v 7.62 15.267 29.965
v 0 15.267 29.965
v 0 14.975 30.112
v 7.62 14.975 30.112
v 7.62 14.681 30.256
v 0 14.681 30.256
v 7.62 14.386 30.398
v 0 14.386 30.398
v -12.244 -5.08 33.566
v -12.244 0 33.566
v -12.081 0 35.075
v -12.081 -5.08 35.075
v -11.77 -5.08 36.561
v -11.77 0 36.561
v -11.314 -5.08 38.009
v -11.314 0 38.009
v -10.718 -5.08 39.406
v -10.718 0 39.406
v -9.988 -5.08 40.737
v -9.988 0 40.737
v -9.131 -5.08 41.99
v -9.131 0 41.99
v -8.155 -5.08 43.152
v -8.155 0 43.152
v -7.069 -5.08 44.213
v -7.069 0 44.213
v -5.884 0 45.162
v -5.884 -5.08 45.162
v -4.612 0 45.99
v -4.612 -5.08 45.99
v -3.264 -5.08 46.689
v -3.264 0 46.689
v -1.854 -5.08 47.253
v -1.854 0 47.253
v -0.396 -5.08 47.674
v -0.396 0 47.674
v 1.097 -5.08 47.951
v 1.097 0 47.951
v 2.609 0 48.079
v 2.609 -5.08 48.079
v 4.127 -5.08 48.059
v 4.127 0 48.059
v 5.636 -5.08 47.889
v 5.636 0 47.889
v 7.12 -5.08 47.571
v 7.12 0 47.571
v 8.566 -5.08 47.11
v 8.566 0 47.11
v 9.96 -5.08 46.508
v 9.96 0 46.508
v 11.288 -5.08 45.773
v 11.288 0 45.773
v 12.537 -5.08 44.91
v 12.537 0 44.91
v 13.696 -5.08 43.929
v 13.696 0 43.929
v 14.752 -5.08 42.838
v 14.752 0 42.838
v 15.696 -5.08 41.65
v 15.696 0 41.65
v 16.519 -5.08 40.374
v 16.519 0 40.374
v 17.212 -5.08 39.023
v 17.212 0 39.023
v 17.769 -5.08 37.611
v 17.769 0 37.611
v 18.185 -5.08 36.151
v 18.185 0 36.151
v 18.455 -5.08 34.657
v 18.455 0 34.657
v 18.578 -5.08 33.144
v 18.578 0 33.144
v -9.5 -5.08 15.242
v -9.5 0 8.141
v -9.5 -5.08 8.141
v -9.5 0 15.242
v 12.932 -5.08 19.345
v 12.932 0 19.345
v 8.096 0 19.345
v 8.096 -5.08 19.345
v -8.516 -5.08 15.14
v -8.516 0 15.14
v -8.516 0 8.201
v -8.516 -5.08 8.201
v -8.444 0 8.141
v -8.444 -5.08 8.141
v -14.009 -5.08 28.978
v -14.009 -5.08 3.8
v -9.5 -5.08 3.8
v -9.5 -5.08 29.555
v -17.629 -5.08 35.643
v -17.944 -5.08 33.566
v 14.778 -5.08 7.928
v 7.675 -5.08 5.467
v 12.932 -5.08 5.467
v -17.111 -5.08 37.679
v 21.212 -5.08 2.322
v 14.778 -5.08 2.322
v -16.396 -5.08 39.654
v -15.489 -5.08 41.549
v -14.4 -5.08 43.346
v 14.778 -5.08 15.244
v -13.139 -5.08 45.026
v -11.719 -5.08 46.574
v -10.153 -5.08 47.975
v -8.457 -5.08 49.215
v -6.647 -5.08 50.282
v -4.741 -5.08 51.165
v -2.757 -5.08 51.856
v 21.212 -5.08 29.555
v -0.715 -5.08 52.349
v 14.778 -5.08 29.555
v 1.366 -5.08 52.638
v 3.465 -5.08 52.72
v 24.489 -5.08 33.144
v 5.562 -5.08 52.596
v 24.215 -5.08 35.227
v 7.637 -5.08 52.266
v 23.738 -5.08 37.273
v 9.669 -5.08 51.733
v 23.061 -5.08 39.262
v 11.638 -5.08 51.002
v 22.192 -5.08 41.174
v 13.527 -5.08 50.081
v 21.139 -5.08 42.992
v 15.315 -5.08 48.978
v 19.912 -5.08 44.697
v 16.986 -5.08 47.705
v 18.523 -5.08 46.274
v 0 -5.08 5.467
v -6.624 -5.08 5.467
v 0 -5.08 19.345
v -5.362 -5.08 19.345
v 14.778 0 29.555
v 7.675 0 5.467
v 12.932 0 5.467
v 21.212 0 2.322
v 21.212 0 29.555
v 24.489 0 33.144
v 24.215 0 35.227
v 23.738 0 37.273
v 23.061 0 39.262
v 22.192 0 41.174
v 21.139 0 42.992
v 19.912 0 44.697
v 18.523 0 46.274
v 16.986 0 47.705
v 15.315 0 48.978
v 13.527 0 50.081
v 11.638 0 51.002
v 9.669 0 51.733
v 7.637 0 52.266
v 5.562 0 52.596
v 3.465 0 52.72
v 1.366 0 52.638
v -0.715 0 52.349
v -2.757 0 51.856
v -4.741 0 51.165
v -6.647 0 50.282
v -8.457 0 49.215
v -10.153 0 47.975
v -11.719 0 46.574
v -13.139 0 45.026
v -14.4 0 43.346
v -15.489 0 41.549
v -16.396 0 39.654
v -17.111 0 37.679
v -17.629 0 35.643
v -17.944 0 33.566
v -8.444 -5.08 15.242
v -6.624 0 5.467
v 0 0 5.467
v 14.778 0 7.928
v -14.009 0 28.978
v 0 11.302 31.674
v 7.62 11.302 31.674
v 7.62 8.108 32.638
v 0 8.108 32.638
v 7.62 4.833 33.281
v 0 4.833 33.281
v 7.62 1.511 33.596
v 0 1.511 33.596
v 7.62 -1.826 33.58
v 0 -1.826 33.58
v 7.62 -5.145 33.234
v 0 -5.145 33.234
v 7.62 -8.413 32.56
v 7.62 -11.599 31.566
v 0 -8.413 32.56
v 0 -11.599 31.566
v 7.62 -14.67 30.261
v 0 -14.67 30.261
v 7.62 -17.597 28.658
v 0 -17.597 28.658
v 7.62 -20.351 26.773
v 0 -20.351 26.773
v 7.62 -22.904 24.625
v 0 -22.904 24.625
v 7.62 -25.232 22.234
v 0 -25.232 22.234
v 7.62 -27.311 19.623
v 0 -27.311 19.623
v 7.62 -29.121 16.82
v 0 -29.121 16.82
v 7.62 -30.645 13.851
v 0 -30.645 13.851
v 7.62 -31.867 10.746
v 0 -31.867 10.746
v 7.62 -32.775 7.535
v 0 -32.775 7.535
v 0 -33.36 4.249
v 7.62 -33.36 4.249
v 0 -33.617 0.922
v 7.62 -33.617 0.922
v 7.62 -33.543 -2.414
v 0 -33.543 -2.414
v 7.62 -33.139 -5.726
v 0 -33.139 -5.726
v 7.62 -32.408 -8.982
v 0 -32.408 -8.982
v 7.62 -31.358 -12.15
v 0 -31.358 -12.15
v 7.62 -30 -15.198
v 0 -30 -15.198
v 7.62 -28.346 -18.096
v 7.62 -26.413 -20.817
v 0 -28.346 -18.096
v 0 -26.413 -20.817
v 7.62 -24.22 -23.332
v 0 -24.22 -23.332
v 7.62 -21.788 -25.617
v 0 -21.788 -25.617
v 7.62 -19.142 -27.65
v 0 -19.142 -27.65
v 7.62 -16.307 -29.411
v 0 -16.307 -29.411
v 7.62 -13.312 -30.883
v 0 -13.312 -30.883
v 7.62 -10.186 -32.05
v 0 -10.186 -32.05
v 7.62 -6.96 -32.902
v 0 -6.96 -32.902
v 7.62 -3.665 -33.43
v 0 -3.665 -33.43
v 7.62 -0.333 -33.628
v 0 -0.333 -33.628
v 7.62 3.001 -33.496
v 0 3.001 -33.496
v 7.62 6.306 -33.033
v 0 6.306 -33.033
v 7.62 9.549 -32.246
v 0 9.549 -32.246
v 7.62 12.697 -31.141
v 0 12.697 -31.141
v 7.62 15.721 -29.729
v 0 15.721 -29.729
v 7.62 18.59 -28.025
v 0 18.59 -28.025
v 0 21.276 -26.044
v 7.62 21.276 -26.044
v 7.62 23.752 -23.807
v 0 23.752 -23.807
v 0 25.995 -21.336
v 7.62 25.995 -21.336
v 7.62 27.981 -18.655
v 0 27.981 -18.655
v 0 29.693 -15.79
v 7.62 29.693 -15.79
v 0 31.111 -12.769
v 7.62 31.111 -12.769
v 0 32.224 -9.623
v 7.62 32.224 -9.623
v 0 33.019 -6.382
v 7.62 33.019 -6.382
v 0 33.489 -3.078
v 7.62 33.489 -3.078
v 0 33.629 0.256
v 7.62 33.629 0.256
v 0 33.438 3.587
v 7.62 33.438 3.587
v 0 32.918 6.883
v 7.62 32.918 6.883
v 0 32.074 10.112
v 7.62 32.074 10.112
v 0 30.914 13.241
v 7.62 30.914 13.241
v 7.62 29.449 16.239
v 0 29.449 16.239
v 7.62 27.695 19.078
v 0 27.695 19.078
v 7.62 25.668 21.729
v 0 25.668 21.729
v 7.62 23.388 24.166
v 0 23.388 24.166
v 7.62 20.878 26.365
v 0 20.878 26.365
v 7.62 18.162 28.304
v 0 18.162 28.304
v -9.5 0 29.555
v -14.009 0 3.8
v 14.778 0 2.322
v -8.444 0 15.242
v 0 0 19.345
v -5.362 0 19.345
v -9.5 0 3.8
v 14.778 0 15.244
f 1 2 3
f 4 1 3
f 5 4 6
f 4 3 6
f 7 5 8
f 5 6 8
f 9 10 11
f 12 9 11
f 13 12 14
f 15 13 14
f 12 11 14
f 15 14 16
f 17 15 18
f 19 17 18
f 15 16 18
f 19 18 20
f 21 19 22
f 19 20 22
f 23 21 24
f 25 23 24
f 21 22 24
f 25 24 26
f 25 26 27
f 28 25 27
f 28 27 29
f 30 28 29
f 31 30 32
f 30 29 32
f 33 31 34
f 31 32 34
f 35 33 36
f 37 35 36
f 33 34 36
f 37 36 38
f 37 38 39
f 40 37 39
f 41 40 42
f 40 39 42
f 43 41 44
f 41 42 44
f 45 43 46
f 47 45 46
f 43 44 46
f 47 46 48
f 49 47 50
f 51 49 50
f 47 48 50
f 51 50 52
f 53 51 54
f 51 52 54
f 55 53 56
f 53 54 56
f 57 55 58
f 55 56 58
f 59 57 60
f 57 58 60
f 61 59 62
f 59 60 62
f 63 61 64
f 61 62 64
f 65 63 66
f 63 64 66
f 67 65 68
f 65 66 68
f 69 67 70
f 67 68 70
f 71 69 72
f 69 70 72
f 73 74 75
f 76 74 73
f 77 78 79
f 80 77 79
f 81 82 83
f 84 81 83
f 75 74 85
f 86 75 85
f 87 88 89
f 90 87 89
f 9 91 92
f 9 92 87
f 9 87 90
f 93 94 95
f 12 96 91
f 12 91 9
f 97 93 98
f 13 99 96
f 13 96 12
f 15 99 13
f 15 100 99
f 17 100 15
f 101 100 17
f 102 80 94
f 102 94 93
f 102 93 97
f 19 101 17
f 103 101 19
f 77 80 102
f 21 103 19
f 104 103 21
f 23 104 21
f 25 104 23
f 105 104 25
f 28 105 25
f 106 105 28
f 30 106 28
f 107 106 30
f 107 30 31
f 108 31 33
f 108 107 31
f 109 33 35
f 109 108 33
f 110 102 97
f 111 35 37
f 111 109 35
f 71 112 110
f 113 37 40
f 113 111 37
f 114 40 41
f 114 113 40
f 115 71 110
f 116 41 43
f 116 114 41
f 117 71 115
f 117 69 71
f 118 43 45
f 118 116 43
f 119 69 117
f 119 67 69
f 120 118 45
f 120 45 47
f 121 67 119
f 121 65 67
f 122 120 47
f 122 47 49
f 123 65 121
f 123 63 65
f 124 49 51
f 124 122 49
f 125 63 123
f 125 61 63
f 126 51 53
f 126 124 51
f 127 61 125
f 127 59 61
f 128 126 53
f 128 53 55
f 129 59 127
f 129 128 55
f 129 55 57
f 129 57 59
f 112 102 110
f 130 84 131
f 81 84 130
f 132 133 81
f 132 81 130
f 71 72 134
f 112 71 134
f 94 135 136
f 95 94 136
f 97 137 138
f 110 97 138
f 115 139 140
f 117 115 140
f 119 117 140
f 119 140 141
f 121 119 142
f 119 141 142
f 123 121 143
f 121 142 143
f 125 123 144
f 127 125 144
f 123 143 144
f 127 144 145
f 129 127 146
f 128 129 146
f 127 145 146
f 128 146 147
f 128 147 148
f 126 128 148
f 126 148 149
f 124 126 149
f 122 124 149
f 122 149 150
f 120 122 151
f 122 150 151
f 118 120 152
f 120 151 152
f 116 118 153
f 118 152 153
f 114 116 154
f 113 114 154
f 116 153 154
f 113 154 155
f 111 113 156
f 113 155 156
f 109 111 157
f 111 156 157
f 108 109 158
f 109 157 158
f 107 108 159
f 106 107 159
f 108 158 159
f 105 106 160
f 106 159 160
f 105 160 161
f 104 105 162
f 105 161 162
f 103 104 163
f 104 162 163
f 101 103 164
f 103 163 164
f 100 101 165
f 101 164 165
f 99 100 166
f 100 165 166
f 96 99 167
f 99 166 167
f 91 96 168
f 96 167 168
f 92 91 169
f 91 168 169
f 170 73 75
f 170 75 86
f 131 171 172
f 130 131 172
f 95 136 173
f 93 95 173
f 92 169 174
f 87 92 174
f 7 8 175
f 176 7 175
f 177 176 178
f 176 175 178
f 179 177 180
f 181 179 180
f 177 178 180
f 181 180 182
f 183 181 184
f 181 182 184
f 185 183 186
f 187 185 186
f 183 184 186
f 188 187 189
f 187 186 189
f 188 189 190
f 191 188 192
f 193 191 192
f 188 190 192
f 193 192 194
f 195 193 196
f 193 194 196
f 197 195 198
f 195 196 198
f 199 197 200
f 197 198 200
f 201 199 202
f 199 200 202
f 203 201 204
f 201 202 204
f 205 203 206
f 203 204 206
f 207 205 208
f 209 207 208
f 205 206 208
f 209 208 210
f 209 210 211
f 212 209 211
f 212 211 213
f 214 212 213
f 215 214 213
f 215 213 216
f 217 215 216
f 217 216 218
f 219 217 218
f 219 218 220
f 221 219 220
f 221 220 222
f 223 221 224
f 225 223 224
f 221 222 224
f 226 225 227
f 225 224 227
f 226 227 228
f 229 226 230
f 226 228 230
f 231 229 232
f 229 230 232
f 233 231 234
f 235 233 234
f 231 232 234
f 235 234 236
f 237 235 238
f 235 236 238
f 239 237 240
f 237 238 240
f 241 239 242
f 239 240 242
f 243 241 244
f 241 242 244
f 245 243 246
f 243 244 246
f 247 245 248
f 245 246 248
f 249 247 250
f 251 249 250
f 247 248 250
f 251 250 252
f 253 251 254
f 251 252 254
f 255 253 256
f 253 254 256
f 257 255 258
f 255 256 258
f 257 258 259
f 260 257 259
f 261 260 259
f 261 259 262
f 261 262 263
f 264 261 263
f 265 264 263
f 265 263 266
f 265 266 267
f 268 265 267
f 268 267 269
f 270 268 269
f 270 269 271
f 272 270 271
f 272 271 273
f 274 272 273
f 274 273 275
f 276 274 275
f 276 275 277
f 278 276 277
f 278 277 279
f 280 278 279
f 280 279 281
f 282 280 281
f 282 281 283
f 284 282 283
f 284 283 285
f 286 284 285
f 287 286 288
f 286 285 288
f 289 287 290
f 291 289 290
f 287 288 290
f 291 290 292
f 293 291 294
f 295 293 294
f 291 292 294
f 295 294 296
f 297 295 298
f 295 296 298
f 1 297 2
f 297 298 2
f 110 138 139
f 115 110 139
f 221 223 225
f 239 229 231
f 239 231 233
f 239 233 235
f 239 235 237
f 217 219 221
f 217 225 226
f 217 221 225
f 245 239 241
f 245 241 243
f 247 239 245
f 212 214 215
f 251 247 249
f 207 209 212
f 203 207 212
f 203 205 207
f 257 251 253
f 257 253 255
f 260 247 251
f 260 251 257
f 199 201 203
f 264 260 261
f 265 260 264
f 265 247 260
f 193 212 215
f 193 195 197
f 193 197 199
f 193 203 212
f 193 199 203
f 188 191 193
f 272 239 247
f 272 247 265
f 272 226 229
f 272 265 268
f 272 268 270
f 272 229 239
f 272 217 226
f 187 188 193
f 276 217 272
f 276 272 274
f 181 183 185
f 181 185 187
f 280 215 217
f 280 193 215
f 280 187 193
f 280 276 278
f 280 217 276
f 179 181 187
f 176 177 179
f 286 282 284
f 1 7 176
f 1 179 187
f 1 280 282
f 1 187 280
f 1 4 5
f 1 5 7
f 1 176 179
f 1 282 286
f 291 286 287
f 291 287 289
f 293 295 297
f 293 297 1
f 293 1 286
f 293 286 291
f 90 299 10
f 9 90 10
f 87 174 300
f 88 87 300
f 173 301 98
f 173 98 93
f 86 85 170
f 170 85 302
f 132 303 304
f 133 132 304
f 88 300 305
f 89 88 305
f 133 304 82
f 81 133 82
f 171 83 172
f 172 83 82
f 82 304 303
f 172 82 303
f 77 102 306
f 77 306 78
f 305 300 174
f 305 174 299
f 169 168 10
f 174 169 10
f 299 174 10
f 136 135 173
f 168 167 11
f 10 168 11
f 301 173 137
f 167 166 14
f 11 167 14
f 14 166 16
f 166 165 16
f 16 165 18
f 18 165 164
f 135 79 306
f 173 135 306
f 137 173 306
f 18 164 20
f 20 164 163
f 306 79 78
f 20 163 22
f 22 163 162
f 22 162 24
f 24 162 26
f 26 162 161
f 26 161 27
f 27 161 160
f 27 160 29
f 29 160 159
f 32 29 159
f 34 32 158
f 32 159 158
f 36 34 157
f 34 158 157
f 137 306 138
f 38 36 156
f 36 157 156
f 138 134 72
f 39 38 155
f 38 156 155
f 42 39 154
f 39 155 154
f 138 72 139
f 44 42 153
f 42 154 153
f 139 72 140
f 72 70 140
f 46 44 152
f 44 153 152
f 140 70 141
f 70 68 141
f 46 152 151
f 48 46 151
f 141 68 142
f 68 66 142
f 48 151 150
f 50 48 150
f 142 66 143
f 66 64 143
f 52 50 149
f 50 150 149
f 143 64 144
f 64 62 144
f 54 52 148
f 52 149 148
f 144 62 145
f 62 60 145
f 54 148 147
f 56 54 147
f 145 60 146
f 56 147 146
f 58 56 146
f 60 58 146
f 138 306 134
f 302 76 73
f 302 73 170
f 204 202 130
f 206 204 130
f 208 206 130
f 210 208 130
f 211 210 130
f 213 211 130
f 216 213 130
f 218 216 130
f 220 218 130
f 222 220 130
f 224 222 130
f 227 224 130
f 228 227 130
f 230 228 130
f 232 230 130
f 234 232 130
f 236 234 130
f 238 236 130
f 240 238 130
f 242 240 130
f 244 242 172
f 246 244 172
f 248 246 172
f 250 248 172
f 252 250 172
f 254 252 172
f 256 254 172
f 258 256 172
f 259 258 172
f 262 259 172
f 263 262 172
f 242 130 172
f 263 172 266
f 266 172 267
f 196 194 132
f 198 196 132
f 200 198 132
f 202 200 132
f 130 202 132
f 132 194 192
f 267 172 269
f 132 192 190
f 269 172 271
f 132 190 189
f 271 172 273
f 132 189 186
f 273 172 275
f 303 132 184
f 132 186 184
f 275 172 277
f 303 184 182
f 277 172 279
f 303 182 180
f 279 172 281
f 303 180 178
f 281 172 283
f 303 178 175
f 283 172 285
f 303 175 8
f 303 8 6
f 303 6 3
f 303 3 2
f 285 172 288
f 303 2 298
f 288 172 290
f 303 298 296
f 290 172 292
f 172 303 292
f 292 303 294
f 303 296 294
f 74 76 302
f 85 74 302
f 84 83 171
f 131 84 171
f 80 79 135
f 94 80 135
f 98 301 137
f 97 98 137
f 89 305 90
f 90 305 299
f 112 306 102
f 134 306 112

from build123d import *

# Parameters (mm, degrees)
F1_DEPTH = 7.62
F3_DEPTH = 5.08
F4_W     = 6.4344388135
F4_H     = 27.2329575382
F5_DEPTH = 5.08
F4_W_2   = 1.0554231703
F4_H_2   = 7.1008047089
F6_DEPTH = 5.08


with BuildPart() as f1:
    # F0 (on Right) → F1 (new body)
    with BuildSketch(Plane.YZ):
        with BuildLine():
            ThreePointArc((14.3857927618, 30.3976343496), (-28.4144271888, -17.9885389893), (33.6298558938, 0))
            ThreePointArc((33.6298558938, 0), (28.6741019189, 17.5716557724), (15.2674170206, 29.9645321165))
            Line((15.2674170206, 29.9645321165), (0.7576213102, 0))
            Line((0.7576213102, 0), (-0.5346691469, 0))
            Line((-0.5346691469, 0), (14.3857927618, 30.3976343496))
        make_face()
        with BuildLine():
            Line((14.3857927618, 30.3976343496), (15.2674170206, 29.9645321165))
            ThreePointArc((15.2674170206, 29.9645321165), (14.8281862339, 30.1843022191), (14.3857927618, 30.3976343496))
        make_face()
        Polygon((0.7576213102, 0), (15.2674170206, 29.9645321165), (14.3857927618, 30.3976343496), (-0.5346691469, 0), align=None)
    extrude(amount=F1_DEPTH)

    # F2 (on Front) → F3, piece 2 (join)
    with BuildSketch(Plane.XZ):
        Polygon((0, 5.4671750404), (0, 19.3453878164), (-5.3620375693, 19.3453878164), (-8.5161766037, 15.1398694143), (-8.5161766037, 8.2007627934), (-6.6236932762, 5.4671750404), align=None)
    extrude(amount=F3_DEPTH)


with BuildPart() as f3:
    # F2 (on Front) → F3 (new body)
    with BuildSketch(Plane.XZ):
        Polygon((12.9319699481, 19.3453878164), (8.0956239253, 19.3453878164), (7.6750712469, 5.4671750404), (12.9319699481, 5.4671750404), (14.8244537413, 7.9904859886), (14.8244537413, 15.1398694143), align=None)
    extrude(amount=F3_DEPTH)

    # F4 (on Front) → F5 (join)
    with BuildSketch(Plane.XZ):
        with BuildLine():
            Line((18.5775198042, 33.1439822912), (24.4885478169, 33.1439822912))
            ThreePointArc((24.4885478169, 33.1439822912), (3.4648664733, 52.7204773521), (-17.9441962391, 33.5661992431))
            Line((-17.9441962391, 33.5661992431), (-12.2442748398, 33.5661992431))
            ThreePointArc((-12.2442748398, 33.5661992431), (3.3684399437, 48.0877449787), (18.5775198042, 33.1439822912))
        make_face()
        Polygon((-9.499868378, 29.5551475137), (-14.0088759054, 28.9778341061), (-14.0088759054, 3.7999474443), (-9.499868378, 3.7999474443), (-9.499868378, 8.1409402192), (-9.499868378, 15.2417449281), align=None)
        Polygon((-12.2442748398, 33.5661992431), (-17.9441962391, 33.5661992431), (-14.0088759054, 28.9778341061), (-9.499868378, 29.5551475137), align=None)
        Polygon((21.212011639, 29.5551475137), (24.4885478169, 33.1439822912), (18.5775198042, 33.1439822912), (14.7775728256, 29.5551475137), align=None)
        with Locations((17.9947922323, 15.9386687446)):
            Rectangle(F4_W, F4_H)
    extrude(amount=F5_DEPTH)


with BuildPart() as f6:
    # F4 (on Front) → F6 (new body)
    with BuildSketch(Plane.XZ):
        with Locations((-8.9721567929, 11.6913425736)):
            Rectangle(F4_W_2, F4_H_2)
    extrude(amount=F6_DEPTH)


solid = Compound([f1.part, f3.part, f6.part])
